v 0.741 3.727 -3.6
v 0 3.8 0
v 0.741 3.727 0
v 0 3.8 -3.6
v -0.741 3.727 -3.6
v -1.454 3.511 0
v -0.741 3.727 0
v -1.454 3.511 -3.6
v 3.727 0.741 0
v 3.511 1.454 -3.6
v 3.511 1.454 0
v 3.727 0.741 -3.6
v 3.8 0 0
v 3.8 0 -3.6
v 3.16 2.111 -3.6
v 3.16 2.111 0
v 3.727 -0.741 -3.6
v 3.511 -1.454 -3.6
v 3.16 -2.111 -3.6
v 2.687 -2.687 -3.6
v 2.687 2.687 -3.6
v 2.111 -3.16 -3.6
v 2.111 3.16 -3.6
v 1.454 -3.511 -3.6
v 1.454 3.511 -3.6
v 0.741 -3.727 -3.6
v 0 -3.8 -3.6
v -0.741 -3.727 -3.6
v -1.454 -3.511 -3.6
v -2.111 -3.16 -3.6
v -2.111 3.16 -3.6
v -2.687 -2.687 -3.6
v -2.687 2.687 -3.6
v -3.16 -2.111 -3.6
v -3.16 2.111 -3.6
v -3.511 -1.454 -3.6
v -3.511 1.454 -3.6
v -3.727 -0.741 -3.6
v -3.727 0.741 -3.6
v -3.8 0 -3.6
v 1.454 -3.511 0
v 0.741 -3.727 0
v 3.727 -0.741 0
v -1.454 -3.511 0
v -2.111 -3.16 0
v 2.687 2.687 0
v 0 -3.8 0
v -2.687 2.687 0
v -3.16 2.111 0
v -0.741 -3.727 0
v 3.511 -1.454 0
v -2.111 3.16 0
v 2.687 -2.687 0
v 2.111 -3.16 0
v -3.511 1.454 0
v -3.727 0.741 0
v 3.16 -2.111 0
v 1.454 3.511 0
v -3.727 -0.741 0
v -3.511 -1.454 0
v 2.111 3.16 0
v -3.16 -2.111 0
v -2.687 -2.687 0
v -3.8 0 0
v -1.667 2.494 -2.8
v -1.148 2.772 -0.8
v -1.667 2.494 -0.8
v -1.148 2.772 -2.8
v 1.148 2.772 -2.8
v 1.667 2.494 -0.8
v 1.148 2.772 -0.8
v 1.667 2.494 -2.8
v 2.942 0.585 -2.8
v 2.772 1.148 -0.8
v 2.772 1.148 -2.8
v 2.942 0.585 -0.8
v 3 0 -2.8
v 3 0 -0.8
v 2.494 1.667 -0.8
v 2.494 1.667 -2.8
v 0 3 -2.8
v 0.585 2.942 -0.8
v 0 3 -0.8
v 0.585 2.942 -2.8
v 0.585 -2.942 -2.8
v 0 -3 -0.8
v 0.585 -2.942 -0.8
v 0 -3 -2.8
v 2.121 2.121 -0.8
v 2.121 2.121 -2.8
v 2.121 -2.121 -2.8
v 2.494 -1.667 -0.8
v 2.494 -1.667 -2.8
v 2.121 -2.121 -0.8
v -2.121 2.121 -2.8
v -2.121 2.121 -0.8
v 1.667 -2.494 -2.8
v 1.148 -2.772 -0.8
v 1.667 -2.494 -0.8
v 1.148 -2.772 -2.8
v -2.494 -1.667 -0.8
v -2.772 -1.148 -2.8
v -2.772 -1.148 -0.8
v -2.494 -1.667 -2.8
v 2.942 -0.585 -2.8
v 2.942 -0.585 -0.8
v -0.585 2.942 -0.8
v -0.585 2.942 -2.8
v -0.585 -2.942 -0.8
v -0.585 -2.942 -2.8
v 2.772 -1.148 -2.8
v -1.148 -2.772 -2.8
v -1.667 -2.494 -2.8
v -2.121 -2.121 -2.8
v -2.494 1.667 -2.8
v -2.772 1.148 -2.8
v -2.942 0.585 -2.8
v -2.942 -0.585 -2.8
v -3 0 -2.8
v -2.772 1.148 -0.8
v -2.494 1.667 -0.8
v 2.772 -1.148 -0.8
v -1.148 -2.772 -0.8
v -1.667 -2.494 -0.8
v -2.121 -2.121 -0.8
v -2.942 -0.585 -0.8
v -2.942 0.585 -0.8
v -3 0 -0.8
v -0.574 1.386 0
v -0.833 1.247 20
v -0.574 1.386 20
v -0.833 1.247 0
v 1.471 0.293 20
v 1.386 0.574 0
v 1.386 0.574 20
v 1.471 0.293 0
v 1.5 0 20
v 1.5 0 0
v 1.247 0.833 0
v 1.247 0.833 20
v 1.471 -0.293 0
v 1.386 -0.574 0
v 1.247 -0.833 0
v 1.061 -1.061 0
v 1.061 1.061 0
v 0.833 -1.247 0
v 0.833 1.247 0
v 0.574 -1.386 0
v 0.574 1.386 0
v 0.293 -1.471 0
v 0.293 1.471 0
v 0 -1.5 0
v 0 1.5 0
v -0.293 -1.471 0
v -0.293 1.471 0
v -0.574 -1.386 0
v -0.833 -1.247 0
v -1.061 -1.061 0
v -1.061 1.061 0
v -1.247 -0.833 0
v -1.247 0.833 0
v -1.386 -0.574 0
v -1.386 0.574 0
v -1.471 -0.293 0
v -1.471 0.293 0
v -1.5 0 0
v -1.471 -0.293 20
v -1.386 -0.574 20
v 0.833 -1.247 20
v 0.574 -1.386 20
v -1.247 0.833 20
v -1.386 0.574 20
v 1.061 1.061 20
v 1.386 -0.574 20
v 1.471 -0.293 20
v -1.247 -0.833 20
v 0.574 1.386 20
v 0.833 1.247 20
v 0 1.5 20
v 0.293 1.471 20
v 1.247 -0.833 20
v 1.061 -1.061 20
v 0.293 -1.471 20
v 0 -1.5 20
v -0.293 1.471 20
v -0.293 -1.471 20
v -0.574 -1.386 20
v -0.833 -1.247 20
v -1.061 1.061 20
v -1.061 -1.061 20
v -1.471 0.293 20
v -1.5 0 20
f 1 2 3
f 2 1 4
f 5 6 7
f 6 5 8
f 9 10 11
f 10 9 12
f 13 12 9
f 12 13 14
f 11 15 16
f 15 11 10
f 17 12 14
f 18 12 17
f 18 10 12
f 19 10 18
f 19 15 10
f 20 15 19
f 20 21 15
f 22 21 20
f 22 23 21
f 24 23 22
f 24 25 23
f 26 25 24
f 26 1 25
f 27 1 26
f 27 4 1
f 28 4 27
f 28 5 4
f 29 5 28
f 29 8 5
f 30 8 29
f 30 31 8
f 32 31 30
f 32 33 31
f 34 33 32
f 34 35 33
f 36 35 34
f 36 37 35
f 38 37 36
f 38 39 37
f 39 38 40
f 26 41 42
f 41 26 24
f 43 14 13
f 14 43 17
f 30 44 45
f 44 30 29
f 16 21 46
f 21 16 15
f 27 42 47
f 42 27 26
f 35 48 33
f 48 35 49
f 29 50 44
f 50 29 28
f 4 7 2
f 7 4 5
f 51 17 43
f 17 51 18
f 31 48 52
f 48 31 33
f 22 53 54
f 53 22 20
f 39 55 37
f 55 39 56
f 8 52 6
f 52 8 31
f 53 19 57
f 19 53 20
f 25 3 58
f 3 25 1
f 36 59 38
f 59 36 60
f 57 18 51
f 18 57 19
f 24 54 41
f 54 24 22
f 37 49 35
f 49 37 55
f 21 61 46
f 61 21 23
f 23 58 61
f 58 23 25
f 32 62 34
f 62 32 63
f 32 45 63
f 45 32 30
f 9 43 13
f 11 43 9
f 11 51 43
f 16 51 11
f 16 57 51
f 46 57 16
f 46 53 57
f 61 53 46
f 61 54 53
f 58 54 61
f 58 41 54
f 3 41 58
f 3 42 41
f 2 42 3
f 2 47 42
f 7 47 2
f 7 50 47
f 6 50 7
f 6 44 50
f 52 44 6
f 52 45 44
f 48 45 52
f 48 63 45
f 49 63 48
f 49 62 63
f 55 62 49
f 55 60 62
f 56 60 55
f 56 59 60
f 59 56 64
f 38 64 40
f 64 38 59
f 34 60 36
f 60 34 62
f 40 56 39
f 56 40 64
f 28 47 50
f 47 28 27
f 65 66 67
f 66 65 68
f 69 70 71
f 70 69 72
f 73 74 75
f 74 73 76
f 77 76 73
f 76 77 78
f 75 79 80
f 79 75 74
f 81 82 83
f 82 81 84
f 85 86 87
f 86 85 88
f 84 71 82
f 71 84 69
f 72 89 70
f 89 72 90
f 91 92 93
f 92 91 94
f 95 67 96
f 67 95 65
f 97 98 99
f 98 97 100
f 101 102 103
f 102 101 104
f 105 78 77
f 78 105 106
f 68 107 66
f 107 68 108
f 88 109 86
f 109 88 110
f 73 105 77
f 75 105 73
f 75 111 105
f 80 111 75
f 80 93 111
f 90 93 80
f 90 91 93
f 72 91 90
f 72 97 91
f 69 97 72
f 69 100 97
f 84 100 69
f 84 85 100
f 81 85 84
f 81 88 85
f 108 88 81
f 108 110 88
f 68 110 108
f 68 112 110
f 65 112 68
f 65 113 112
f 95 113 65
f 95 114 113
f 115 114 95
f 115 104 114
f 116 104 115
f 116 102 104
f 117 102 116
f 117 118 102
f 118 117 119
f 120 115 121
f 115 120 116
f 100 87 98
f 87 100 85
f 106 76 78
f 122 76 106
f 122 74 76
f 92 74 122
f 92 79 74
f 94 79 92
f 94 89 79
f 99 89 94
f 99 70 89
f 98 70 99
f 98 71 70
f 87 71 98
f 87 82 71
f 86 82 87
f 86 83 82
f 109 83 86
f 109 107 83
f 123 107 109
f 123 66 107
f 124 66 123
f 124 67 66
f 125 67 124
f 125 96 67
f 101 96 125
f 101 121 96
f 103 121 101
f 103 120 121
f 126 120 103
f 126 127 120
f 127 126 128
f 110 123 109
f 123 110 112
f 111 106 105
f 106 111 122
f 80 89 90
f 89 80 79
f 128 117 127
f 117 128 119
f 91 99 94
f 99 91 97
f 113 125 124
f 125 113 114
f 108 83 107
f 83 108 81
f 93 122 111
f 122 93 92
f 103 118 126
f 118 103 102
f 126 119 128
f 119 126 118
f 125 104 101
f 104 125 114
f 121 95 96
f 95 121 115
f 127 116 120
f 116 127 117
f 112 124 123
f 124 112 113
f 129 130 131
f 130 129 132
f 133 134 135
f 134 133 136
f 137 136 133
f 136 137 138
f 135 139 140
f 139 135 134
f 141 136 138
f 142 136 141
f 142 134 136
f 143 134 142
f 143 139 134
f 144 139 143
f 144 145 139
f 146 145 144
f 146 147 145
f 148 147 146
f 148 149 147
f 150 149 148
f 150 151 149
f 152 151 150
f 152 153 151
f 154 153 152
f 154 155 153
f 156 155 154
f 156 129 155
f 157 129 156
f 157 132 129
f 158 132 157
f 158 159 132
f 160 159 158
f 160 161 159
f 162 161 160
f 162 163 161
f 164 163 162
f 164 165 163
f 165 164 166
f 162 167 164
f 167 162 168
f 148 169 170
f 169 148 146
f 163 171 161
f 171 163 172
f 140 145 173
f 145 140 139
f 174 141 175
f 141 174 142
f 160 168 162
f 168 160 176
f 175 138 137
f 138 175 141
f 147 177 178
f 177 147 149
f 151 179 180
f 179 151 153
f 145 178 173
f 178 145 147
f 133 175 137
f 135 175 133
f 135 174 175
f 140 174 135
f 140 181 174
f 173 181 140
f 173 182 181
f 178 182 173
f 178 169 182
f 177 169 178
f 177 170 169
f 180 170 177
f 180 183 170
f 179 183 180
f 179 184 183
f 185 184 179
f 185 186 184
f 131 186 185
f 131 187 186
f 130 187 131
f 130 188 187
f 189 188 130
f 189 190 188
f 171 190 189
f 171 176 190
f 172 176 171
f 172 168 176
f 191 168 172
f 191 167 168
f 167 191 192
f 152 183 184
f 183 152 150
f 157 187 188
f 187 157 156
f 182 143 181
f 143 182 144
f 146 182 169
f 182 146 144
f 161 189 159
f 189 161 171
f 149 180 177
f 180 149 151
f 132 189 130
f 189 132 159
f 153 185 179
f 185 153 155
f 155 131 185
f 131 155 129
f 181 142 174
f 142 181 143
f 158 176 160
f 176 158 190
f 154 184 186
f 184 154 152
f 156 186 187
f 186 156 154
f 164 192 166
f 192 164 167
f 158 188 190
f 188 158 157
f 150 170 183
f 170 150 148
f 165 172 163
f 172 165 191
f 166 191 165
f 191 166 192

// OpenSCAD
// file: syms.scad
module symY(t) {
    translate(t)
        children();
    mirror([0,1,0])
        translate(t)
            children();
}
module symX(t) {
    translate(t)
        children();
    mirror([1,0,0])
        translate(t)
            children();
}

module symZ(t) {
    translate(t)
        children();
    mirror([0,0,1])
        translate(t)
            children();
}

module	symXY(t) {
	tx=t[0];
	ty=t[1];
	tz=t[2];
	symX([tx,0,0])
	symY([0,ty,tz])
		children();
}
// main file
use <syms.scad>;

L=80;
AXIS_L=L*3/4;
TRACK_IN=2;
W=1.6;
SP=1;
SPACER_H=.5;
AXIS_R=3.2/2;
WHEEL_R=TRACK_IN+SP+W+AXIS_R;
WHEEL_H=W;
SCREW_L=6;
NUT_H=1;
eps=1e-4;
SIDE_W=20;
CARRIAGE_H=WHEEL_R+SP;

$fn=32;
module wheel() {
    difference() {
        cylinder(r=WHEEL_R, h=WHEEL_H,center=true);
        cylinder(r=AXIS_R,h=100,center=true);
    }
}

//wheel();

module wheelPlatform() {
    SCREW_STOP=(SIDE_W/2+SPACER_H+WHEEL_H)-SCREW_L;
    echo(SCREW_STOP);
    module side() {
        hull() {
            rotate(90,[1,0,0])
            cylinder(r=AXIS_R,h=SIDE_W,center=true);
            translate([0,0,CARRIAGE_H])
                cube([15,SIDE_W,eps],center=true);
        }
        rotate(90,[1,0,0])
        cylinder(r=AXIS_R+W,h=SIDE_W,center=true);
    }
    
    module cutoutPattern() {
        translate([0,-SCREW_STOP,0])
        rotate(90,[1,0,0])
        cylinder(r=AXIS_R,h=100);
        NUT_Y=( SIDE_W/2+SCREW_STOP)/2;
        hull()
        for(z=[0,-10])
        translate([0,-NUT_Y,z])
        rotate(90,[1,0,0])
        rotate(90)
        cylinder($fn=6,d=5.5,h=NUT_H);
    }
    
//    translate([0,SIDE_W/2,0])
    difference() {
        side();
        symY([0,0,0])
        cutoutPattern();
    }
    
}

module attachment() {
    AW=W/2;
    MAGNET_D=6;
    MAGNET_H=2;

    D1=MAGNET_D;
    H1=MAGNET_H;
    D2=MAGNET_D+2*AW;
    H2=MAGNET_H+2*AW;
    D3=3;
    H3=20;

    translate([0,0,-H2/2])
    difference() {
        cylinder(d=D2,h=H2,center=true);
        cylinder(d=D1,h=H1,center=true);
    }
    cylinder(d1=D3,d2=D3,h=H3);
}

module roundedBlock(dim=[10,10,2],zPos=0) {
    hull()
    symXY([dim[0],dim[1],zPos]){
        sphere(d=dim[2]);
    }
}


module body() {
    module posPart() {
        symX([AXIS_L/2,0,0])
        wheelPlatform();
        translate([0,0,CARRIAGE_H])
        roundedBlock([L/2,SIDE_W/2,W],center=true);
        translate([0,0,CARRIAGE_H-W])
        cube([SIDE_W,2*W,2*W],center=true);
       //        roundedBlock([SIDE_W,SIDE_W/2,W],center=true);
        symX([AXIS_L/2,0,0])  {
            cylinder(d=CARRIAGE_H);
            cylinder(d=W);
            
        }
    }
    
    difference() {
        posPart();
        symX([-L/2,0,CARRIAGE_H-W-W-W])
        rotate(85,[0,1,0])
        hull()
        symY([0,W,0])
        attachment();
        
        symX([SIDE_W/4,0,CARRIAGE_H-W])
        rotate(90,[1,0,0])
        cylinder(d=1,h=10,center=true);
    }
    
}


mode="attach";
if(mode=="preview") {
    
    body();
    symX([AXIS_L/2,0,0])
    symY([0,-SIDE_W/2-WHEEL_H/2-SPACER_H,0])
    rotate(90,[1,0,0])
    wheel();
}
if(mode=="wp") {
    wheelPlatform();
    translate([0,-SIDE_W/2-WHEEL_H/2-SPACER_H,0])
    rotate(90,[1,0,0])
    wheel();
}

if(mode=="attach"){
    attachment();
}
